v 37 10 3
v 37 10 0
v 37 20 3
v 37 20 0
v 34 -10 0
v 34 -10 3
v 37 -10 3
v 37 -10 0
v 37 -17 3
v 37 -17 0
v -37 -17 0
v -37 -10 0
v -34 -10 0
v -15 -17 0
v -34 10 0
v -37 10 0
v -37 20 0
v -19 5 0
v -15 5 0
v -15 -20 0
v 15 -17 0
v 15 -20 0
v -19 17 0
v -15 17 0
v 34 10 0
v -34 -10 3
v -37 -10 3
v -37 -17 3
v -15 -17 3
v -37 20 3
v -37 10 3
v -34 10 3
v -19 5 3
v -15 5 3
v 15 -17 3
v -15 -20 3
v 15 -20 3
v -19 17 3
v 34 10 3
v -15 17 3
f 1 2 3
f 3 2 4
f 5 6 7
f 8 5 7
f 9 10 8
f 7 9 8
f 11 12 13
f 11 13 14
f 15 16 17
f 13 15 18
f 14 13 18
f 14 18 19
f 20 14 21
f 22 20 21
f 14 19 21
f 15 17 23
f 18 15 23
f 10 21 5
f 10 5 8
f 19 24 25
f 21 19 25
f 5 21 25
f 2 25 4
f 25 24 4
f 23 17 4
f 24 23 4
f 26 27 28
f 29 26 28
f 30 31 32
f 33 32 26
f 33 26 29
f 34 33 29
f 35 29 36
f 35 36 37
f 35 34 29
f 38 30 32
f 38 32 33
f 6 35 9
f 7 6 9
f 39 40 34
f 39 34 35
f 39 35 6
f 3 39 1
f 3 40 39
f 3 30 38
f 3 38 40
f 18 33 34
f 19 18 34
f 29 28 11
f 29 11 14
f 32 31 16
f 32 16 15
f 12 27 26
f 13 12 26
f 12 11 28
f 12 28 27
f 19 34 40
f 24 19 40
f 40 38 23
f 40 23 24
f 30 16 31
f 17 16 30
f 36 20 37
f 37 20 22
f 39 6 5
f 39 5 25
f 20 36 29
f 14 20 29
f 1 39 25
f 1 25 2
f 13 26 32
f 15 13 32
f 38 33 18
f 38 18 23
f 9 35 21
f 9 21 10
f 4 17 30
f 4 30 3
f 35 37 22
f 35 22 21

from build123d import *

# Parameters (mm, degrees)
ESBO_O1_W                = 74
ESBO_O1_H                = 40
RESSALTO_EXTRUS_O1_DEPTH = 3
ESBO_O2_W                = 22
ESBO_O2_H                = 3
ESBO_O2_W_2              = 3
ESBO_O2_H_2              = 20
CORTE_EXTRUS_O1_DEPTH    = 3
ESBO_O3_W                = 4
ESBO_O3_H                = 12
CORTE_EXTRUS_O2_DEPTH    = 10


with BuildPart() as part:
    # Esboço1 → Ressalto-extrusão1 (new body)
    with BuildSketch(Plane.XY):
        Rectangle(ESBO_O1_W, ESBO_O1_H)
    extrude(amount=RESSALTO_EXTRUS_O1_DEPTH)

    # Esboço2 → Corte-extrusão1 (cut)
    with BuildSketch(Plane.XY.offset(3)):
        with Locations((-26, -18.5)):
            Rectangle(ESBO_O2_W, ESBO_O2_H)
        with Locations((26, -18.5)):
            Rectangle(ESBO_O2_W, ESBO_O2_H)
        with Locations((-35.5, 0)):
            Rectangle(ESBO_O2_W_2, ESBO_O2_H_2)
        with Locations((35.5, 0)):
            Rectangle(ESBO_O2_W_2, ESBO_O2_H_2)
    extrude(amount=-CORTE_EXTRUS_O1_DEPTH, mode=Mode.SUBTRACT)

    # Esboço3 → Corte-extrusão2 (cut)
    with BuildSketch(Plane.XY.offset(3)):
        with Locations((-17, 11)):
            Rectangle(ESBO_O3_W, ESBO_O3_H)
    extrude(amount=-CORTE_EXTRUS_O2_DEPTH, mode=Mode.SUBTRACT)


solid = part.part
